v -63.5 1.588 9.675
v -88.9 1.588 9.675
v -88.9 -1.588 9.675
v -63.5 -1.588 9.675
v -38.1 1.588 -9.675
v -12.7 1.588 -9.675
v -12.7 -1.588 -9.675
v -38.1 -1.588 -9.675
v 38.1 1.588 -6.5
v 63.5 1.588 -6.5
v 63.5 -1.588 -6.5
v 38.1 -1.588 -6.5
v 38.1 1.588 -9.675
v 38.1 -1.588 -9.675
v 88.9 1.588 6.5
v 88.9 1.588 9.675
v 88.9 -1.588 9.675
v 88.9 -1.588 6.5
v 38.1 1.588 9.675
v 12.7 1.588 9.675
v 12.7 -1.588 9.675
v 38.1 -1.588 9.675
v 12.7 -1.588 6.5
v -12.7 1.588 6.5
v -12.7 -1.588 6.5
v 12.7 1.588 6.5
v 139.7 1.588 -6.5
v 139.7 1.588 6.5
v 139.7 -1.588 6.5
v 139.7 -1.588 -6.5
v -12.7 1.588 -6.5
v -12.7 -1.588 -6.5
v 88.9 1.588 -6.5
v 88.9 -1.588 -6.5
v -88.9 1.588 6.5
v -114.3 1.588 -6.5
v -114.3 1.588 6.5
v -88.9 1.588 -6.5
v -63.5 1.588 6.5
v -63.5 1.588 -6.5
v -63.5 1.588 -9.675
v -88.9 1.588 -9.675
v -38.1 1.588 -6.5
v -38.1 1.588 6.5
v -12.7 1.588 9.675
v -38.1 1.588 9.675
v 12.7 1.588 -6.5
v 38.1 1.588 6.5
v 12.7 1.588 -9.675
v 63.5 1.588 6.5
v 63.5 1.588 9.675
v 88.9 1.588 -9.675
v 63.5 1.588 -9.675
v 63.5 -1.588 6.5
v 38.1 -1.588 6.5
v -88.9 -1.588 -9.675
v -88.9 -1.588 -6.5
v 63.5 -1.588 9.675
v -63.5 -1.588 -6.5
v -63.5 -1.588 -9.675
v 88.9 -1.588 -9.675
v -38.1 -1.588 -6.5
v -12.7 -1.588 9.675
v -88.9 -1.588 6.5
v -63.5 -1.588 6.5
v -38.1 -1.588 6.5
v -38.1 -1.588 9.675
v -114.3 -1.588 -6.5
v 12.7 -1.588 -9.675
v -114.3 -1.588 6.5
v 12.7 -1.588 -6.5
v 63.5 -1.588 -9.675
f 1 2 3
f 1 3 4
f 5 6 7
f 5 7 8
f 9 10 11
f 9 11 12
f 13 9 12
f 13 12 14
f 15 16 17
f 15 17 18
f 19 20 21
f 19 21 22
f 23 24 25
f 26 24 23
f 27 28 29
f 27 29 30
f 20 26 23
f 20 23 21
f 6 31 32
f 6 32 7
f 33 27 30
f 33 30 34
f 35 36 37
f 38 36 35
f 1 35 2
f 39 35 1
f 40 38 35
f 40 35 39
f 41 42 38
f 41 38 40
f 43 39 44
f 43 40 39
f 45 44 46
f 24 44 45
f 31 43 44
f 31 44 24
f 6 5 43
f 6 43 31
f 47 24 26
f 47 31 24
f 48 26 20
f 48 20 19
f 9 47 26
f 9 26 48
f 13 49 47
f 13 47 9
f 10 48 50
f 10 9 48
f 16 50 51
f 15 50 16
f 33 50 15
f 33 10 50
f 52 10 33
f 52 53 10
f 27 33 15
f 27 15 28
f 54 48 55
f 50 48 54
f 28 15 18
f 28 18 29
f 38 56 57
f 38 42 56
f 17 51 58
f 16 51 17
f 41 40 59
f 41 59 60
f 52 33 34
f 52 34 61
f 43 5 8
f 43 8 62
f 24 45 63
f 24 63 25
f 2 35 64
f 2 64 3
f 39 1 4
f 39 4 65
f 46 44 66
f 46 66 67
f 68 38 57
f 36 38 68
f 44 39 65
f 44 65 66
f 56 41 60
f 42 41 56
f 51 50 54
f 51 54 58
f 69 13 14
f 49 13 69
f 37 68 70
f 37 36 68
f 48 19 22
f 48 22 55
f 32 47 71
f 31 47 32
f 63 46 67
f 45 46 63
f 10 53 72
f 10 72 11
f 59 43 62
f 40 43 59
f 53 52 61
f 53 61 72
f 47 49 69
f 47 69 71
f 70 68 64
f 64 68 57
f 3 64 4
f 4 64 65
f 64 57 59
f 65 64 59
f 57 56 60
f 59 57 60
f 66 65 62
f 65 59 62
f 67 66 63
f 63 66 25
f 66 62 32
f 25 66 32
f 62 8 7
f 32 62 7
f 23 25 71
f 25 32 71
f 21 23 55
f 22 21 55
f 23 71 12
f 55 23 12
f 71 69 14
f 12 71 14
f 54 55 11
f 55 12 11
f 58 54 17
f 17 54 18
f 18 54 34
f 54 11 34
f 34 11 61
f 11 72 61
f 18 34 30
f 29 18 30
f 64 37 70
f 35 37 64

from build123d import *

# Parameters (mm, degrees)
BOSS_EXTRUDE1_DEPTH = 1.5875


with BuildPart() as part:
    # Sketch1 → Boss-Extrude1 (new body, symmetric)
    with BuildSketch(Plane(origin=(0, 0, 0), x_dir=(1, 0, 0), z_dir=(0, 1, 0))):
        Polygon((-114.3, 6.5), (-114.3, -6.5), (-88.9, -6.5), (-88.9, -9.675), (-63.5, -9.675), (-63.5, -6.5), (-38.1, -6.5), (-38.1, -9.675), (-12.7, -9.675), (-12.7, -6.5), (12.7, -6.5), (12.7, -9.675), (38.1, -9.675), (38.1, -6.5), (63.5, -6.5), (63.5, -9.675), (88.9, -9.675), (88.9, -6.5), (139.7, -6.5), (139.7, 6.5), (88.9, 6.5), (88.9, 9.675), (63.5, 9.675), (63.5, 6.5), (38.1, 6.5), (38.1, 9.675), (12.7, 9.675), (12.7, 6.5), (-12.7, 6.5), (-12.7, 9.675), (-38.1, 9.675), (-38.1, 6.5), (-63.5, 6.5), (-63.5, 9.675), (-88.9, 9.675), (-88.9, 6.5), align=None)
    extrude(amount=BOSS_EXTRUDE1_DEPTH, both=True)


solid = part.part
